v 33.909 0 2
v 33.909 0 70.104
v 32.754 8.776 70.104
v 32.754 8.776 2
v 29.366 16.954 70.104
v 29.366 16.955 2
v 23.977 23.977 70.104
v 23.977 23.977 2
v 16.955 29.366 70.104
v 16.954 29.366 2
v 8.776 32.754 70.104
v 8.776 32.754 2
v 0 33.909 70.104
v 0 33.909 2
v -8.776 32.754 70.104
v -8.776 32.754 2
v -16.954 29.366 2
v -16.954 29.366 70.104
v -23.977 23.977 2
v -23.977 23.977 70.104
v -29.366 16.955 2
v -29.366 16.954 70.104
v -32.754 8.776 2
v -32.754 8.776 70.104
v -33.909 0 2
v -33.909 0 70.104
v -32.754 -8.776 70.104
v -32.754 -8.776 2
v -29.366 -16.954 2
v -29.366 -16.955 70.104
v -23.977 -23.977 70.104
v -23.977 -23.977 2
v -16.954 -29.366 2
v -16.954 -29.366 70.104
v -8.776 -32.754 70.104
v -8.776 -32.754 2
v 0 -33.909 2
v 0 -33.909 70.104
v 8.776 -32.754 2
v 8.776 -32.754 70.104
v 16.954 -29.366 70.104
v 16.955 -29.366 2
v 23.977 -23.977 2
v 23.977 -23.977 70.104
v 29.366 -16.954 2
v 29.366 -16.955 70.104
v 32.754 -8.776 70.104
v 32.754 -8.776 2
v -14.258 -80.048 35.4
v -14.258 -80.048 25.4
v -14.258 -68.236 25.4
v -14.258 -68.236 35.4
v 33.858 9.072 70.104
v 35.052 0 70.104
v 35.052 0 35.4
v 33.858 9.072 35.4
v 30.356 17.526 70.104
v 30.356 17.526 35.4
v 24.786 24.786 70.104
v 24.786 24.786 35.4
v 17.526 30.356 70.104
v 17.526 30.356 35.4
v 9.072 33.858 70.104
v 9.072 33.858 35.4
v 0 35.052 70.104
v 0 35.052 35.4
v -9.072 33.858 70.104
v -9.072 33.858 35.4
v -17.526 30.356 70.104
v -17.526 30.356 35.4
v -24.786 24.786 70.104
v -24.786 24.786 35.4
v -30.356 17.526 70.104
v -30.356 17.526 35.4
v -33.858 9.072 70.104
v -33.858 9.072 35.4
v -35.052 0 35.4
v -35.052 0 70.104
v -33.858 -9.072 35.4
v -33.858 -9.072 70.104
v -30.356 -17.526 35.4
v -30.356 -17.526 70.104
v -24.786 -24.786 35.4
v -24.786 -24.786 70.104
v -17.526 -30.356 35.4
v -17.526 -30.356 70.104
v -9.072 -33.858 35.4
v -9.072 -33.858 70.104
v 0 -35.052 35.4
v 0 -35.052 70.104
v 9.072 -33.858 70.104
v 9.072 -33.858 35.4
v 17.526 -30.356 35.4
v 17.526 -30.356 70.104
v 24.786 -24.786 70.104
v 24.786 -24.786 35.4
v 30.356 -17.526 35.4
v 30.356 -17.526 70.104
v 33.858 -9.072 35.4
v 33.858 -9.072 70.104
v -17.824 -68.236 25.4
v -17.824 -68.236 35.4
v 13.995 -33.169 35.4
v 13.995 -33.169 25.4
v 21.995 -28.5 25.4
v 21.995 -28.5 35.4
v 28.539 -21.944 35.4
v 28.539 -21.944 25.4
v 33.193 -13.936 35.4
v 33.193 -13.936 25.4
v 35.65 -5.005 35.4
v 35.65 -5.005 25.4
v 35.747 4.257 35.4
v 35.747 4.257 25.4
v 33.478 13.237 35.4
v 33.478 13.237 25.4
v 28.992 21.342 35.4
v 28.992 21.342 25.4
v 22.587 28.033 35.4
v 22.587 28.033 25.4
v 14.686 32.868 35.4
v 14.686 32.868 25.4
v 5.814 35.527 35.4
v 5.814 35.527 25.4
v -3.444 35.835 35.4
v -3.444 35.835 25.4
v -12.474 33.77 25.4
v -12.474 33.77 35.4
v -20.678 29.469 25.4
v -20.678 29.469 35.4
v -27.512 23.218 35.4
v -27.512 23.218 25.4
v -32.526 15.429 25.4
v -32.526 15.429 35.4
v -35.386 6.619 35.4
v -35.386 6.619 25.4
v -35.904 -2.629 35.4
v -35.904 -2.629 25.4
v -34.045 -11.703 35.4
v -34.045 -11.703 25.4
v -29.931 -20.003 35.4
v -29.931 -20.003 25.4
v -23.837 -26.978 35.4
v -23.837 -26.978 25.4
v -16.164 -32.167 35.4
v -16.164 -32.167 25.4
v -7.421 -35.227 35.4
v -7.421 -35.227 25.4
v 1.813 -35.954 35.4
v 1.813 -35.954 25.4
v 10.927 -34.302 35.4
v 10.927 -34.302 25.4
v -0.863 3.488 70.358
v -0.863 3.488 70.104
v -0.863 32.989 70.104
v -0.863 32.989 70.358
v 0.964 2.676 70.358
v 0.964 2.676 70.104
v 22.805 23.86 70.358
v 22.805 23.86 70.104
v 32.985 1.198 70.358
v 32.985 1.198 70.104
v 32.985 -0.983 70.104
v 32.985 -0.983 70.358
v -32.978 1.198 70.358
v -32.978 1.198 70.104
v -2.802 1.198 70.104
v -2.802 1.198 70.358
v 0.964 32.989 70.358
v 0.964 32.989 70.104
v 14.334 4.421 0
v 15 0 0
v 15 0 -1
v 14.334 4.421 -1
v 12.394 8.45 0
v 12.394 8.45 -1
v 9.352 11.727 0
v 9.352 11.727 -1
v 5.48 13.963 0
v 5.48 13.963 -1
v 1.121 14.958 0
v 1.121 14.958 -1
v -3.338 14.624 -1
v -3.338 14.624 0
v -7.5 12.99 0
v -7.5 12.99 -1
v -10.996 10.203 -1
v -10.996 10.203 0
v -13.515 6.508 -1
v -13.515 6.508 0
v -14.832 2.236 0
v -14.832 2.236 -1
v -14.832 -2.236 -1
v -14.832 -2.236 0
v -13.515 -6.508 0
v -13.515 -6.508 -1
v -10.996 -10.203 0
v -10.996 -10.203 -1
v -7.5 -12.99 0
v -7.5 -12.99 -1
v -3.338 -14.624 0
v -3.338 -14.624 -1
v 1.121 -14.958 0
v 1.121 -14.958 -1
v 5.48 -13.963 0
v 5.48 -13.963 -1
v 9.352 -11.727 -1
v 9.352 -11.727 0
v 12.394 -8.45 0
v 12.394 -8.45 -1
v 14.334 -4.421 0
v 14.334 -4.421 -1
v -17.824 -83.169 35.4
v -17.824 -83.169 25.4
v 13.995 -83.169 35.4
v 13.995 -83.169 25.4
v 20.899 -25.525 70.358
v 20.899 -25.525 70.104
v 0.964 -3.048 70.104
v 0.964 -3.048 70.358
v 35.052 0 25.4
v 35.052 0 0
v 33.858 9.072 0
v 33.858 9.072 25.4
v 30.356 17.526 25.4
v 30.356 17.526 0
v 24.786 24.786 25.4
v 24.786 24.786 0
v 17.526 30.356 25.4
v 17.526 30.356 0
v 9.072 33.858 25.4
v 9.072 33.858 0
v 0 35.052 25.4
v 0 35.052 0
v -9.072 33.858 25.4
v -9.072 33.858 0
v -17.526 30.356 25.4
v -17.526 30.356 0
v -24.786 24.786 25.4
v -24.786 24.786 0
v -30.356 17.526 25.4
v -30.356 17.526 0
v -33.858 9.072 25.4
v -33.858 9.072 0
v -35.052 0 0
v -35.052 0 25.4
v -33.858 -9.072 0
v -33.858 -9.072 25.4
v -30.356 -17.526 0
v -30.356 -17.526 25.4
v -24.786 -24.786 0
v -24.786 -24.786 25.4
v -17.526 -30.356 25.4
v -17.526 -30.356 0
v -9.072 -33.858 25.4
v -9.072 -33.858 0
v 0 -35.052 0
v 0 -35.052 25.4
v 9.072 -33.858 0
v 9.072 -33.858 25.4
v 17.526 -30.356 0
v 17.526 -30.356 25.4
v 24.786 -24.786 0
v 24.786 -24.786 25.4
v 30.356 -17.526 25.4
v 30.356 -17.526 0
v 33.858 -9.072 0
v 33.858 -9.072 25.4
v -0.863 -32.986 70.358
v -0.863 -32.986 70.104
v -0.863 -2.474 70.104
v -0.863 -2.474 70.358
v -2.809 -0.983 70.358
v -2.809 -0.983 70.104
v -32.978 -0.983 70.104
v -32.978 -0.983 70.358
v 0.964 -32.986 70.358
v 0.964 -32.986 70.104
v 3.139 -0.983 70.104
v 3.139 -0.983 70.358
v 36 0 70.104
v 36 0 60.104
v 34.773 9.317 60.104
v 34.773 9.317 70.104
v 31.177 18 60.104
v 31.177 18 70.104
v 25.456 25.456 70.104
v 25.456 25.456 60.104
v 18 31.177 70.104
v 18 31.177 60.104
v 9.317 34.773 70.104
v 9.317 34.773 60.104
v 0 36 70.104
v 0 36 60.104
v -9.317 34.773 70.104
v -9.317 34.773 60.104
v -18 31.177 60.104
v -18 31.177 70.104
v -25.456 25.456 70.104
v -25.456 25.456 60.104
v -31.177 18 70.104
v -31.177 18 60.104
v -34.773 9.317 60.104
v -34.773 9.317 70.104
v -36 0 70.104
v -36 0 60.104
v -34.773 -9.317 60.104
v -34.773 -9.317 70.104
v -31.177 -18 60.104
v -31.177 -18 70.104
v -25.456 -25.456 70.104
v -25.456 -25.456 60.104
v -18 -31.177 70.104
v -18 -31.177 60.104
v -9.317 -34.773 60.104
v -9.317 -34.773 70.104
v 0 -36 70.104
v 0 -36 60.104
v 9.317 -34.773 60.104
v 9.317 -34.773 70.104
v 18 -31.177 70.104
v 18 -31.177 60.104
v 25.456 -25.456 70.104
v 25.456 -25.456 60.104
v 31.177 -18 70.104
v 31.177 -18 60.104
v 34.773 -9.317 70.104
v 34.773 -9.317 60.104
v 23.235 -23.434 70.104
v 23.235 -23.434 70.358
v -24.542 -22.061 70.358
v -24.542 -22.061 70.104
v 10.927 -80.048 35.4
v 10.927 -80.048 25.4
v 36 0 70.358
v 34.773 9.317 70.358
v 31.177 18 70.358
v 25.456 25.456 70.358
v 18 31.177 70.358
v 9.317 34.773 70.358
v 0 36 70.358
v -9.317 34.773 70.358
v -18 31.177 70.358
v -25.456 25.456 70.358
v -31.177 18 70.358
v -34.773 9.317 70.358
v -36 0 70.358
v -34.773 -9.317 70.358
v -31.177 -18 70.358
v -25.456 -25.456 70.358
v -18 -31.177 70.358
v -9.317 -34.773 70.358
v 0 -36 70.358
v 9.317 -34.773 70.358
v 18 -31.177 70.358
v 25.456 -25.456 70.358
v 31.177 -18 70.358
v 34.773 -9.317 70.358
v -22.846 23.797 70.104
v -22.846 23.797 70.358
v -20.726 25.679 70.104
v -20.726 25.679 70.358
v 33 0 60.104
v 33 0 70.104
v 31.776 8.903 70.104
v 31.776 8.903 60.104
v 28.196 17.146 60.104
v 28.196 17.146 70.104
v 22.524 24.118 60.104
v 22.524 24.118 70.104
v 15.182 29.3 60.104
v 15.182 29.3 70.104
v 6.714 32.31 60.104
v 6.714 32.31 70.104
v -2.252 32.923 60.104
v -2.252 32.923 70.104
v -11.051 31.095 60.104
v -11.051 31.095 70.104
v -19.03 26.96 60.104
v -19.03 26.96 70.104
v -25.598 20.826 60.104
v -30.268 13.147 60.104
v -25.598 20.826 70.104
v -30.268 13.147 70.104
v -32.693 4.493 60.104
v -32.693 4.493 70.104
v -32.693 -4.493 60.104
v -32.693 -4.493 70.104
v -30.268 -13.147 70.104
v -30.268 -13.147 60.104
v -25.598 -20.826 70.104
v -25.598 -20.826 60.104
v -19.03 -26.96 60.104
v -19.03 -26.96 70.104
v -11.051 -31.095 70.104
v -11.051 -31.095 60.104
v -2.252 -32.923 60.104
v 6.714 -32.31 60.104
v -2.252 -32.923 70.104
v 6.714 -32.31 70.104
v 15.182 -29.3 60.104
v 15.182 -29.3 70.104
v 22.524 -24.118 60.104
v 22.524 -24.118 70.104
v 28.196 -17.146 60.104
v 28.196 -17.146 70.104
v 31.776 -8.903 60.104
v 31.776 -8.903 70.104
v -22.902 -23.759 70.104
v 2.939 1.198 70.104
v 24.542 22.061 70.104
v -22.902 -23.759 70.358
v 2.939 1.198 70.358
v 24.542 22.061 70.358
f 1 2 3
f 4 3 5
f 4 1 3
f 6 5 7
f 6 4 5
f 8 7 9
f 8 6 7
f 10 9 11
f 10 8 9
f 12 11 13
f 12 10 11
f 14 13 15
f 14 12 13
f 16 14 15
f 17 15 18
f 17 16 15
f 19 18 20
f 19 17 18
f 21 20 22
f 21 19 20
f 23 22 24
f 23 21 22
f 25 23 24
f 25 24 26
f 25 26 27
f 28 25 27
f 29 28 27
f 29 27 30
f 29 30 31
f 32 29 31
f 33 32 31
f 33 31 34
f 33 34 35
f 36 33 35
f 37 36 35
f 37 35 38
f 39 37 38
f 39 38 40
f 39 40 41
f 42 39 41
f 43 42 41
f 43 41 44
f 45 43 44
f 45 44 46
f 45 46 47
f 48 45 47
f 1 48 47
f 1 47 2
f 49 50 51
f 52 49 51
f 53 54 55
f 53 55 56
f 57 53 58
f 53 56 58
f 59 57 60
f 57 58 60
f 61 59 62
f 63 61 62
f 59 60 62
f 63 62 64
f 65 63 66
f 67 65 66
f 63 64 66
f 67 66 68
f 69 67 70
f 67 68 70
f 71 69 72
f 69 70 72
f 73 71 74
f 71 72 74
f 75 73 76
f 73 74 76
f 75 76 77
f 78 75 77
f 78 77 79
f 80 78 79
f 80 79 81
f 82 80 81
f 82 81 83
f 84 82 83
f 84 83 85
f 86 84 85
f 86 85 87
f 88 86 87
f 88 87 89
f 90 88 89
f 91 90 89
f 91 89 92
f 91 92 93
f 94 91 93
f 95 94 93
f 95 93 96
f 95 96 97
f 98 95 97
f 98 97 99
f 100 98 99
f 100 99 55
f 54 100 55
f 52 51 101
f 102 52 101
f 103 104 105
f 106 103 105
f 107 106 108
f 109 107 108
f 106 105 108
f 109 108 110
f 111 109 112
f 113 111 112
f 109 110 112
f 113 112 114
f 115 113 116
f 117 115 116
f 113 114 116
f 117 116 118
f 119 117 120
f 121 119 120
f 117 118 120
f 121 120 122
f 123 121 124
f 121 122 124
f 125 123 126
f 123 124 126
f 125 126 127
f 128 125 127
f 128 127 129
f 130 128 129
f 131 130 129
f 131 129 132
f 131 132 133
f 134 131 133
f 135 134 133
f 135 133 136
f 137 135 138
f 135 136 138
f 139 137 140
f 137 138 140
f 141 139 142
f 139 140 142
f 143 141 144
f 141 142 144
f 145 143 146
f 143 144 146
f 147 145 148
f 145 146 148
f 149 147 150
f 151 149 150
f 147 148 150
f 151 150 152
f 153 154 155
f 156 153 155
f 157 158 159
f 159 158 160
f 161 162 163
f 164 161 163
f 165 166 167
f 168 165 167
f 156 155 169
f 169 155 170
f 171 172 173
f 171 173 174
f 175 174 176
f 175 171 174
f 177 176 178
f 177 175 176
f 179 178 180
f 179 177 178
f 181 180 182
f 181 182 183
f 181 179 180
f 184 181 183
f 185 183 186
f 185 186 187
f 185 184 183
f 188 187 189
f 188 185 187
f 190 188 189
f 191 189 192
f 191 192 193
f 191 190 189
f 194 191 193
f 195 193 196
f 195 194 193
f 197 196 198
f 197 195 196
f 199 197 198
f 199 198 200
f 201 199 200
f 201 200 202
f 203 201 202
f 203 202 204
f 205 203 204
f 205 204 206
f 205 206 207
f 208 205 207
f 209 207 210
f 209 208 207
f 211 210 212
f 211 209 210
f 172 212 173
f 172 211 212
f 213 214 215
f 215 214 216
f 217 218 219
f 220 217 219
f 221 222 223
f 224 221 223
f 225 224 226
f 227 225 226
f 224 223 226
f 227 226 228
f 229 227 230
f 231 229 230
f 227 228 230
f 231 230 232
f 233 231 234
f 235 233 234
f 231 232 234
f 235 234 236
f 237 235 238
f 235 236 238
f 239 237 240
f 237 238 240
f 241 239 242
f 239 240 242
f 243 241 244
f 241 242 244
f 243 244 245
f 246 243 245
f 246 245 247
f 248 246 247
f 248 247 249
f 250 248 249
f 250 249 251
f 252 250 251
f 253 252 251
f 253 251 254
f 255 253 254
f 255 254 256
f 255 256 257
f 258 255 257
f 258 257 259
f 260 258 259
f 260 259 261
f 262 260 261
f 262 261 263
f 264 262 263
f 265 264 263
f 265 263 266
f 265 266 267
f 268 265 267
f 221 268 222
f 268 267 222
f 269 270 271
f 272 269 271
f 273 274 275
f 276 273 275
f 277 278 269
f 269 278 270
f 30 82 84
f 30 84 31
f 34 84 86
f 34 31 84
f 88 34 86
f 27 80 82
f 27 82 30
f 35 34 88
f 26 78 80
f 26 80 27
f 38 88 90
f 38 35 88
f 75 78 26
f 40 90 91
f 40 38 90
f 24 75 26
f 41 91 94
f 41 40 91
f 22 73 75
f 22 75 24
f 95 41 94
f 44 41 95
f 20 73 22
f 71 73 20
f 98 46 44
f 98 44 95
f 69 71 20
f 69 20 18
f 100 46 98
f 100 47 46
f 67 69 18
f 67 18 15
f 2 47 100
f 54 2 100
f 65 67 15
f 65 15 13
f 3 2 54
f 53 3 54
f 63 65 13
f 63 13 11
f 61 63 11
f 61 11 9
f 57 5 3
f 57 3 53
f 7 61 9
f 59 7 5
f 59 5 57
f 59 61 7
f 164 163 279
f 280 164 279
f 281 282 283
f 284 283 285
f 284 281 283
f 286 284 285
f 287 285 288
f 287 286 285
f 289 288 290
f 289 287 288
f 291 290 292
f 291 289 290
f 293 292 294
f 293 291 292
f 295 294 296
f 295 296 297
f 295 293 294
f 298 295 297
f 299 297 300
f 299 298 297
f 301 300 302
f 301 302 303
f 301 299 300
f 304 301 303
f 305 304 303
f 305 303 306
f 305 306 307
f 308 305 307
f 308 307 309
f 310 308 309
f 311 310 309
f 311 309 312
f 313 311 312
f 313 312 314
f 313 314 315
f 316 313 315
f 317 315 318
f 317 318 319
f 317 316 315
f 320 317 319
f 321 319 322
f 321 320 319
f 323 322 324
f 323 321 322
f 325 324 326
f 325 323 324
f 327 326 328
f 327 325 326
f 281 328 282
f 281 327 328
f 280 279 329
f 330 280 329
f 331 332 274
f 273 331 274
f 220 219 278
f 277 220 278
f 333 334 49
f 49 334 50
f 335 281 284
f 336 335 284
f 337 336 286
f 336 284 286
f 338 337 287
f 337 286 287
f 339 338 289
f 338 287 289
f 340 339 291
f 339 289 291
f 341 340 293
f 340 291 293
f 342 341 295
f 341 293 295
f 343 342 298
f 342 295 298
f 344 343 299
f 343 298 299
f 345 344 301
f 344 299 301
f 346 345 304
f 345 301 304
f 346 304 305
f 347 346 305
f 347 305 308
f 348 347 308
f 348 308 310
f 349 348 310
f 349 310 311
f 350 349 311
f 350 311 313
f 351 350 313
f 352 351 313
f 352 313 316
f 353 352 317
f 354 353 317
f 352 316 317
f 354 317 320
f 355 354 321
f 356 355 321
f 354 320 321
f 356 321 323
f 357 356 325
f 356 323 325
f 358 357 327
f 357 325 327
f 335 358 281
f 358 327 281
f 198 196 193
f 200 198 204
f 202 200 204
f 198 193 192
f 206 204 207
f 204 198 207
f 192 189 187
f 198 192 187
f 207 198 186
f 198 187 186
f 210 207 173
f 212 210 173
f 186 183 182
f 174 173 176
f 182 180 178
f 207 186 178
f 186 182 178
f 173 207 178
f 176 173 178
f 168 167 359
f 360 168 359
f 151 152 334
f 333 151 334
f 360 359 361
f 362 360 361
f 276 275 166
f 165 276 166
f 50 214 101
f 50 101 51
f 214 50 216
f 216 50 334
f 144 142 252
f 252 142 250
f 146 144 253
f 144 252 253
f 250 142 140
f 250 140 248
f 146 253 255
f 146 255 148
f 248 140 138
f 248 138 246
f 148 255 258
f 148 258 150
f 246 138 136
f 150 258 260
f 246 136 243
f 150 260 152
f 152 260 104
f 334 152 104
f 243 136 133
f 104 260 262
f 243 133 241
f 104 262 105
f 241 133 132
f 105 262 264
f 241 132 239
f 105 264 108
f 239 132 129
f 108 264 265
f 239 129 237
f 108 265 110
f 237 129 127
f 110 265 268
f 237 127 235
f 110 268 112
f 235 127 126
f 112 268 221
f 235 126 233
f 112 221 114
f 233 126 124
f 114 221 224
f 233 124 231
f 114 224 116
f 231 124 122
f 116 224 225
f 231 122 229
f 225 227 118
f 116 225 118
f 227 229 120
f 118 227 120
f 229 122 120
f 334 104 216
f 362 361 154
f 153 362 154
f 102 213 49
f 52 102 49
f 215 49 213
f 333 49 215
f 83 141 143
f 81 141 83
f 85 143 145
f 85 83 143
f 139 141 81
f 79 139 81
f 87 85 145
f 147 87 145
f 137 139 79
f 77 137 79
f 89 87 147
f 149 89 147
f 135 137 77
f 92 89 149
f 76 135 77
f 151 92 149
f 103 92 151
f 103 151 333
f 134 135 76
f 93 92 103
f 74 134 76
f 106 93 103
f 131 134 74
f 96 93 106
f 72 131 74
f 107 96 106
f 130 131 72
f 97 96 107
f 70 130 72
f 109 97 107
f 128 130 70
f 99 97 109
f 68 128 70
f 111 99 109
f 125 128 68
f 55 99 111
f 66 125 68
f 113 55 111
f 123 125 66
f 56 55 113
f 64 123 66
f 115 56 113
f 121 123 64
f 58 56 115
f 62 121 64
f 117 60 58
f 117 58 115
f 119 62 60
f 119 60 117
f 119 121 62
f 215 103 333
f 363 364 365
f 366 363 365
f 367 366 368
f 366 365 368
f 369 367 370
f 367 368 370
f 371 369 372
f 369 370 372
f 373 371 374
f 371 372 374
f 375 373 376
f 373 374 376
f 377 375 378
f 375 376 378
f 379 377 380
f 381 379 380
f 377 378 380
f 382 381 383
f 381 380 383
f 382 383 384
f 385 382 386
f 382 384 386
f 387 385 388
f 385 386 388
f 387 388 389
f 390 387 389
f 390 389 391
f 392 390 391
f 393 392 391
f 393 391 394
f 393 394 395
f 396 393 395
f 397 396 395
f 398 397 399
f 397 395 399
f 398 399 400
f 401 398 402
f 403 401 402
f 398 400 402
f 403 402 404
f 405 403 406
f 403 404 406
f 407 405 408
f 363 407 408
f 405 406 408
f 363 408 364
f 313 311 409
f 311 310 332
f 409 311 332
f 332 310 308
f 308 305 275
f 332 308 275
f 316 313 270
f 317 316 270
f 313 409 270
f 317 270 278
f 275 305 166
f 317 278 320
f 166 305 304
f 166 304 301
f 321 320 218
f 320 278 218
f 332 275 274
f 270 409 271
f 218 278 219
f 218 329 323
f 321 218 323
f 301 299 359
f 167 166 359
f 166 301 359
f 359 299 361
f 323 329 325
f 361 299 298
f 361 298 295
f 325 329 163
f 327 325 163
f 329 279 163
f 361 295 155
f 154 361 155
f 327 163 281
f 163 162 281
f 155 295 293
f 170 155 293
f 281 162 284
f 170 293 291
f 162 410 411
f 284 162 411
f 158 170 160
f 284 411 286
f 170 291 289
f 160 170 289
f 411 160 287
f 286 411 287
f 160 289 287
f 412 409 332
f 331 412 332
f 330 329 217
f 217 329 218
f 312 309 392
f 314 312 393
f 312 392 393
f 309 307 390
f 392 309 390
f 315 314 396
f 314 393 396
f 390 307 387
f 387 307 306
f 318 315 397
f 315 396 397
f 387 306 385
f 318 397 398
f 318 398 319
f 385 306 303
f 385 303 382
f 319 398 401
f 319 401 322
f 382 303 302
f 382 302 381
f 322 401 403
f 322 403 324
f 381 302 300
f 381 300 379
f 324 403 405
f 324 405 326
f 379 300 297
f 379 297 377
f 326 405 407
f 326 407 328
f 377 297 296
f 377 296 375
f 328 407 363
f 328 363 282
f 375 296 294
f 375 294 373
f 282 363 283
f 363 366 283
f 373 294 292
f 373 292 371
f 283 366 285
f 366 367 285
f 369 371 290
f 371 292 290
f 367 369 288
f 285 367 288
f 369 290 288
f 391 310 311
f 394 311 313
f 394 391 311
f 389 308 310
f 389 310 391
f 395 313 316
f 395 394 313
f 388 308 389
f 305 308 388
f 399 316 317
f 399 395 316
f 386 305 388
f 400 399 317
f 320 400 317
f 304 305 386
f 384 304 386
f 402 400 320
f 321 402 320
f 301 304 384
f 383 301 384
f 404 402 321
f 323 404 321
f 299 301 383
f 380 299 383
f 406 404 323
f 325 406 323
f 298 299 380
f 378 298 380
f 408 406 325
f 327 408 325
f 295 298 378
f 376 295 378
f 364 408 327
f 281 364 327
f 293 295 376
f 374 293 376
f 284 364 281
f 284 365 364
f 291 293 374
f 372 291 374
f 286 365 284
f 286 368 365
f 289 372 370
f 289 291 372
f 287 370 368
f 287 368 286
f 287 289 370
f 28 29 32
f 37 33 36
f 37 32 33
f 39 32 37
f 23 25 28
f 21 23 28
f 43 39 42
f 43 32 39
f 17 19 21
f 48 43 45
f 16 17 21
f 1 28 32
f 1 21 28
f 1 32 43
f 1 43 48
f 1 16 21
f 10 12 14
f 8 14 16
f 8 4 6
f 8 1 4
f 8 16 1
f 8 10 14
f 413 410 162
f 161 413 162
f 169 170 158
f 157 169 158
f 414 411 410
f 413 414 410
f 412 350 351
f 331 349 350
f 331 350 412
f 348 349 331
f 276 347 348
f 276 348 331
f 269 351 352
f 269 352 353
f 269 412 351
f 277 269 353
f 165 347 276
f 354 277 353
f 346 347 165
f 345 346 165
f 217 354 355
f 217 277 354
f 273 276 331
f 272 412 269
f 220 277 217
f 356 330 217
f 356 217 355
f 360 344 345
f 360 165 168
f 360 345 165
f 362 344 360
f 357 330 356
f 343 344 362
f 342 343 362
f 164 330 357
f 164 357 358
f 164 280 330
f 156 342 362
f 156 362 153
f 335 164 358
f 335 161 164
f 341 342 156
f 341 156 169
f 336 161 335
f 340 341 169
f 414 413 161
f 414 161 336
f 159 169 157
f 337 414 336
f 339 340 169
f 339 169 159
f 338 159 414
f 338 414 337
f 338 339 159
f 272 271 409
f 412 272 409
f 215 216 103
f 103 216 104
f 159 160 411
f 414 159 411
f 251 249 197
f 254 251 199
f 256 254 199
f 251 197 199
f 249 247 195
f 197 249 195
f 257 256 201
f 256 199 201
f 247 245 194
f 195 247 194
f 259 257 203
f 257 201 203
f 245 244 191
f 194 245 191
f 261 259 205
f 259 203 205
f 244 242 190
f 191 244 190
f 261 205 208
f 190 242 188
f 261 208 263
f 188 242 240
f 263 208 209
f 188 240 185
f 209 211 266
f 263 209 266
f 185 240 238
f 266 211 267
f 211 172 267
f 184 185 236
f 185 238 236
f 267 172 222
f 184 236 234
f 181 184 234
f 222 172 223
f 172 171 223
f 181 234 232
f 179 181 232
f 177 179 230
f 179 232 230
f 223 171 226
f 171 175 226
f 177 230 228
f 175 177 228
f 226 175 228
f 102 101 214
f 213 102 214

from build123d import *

# Parameters (mm, degrees)
F0_R      = 35.052
F0_R_2    = 33.909
F1_DEPTH  = 70.104
F2_R      = 35.052
F3_DEPTH  = 1.999996
F4_R      = 14.99997
F5_DEPTH  = 0.999998
F6_R      = 36.0000042
F6_R_2    = 32.9999975
F7_DEPTH  = 9.99998
F8_R      = 36.0000042
F9_DEPTH  = 0.9398
F11_R     = 35.052
F12_DEPTH = 10.0000054
F13_DEPTH = 10.0000054
F14_DEPTH = 0.254


with BuildPart() as f1:
    # F0 (on Top) → F1 (new body)
    with BuildSketch(Plane.XY):
        Circle(F0_R)
        Circle(F0_R_2, mode=Mode.SUBTRACT)
    extrude(amount=F1_DEPTH)

    # F2 (on Top) → F3 (join)
    with BuildSketch(Plane.XY):
        Circle(F2_R)
    extrude(amount=F3_DEPTH)

    # F4 (on face) → F5 (join)
    with BuildSketch(Plane.XY):
        Circle(F4_R)
    extrude(amount=-F5_DEPTH)

    # F8 (on face) → F9 (cut)
    with BuildSketch(Plane.XY.offset(70.104)):
        Circle(F8_R)
        Polygon((-0.8631545961, 3.4883117496), (-0.8631545961, 32.9887071457), (0.9636605694, 32.9887071457), (0.9636605694, 2.6763906699), (22.80452686, 23.8601211458), (24.5416078782, 22.0614894727), (2.938679691, 1.1978312537), (32.9853559722, 1.1978312537), (32.9853559722, -0.9829172856), (3.1389852868, -0.9829172856), (23.2346414068, -23.4339769074), (20.899284631, -25.5249813199), (0.9636605694, -3.0481130643), (0.9636605694, -32.9859241694), (-0.8631545961, -32.9859241694), (-0.8631545961, -2.4739011377), (-22.9023173451, -23.7588656131), (-24.5416078782, -22.0614894727), (-2.8091619684, -0.9829172856), (-32.9782509434, -0.9829172856), (-32.9782509434, 1.1978312537), (-2.8022354953, 1.1978312537), (-22.8459511004, 23.796569754), (-20.7260778787, 25.6793600147), align=None, mode=Mode.SUBTRACT)
    extrude(amount=F9_DEPTH, mode=Mode.SUBTRACT)

    # F11 (on offset) → F12 (join)
    with BuildSketch(Plane.XY.offset(25.4)):
        with BuildLine():
            ThreePointArc((13.9945056409, -33.1685711822), (29.998354657, -19.9022365646), (36.0000042, 0))
            ThreePointArc((36.0000042, 0), (-29.0635094887, 21.2441219776), (10.9270783141, -34.3015927023))
            Line((10.9270783141, -34.3015927023), (13.9945056409, -33.1685711822))
        make_face()
        Circle(F11_R, mode=Mode.SUBTRACT)
        with BuildLine():
            Line((13.9945056409, -33.1685711822), (10.9270783141, -34.3015927023))
            ThreePointArc((10.9270783141, -34.3015927023), (12.4736631007, -33.769927913), (13.9945056409, -33.1685711822))
        make_face()
        with BuildLine():
            ThreePointArc((13.9945056409, -33.1685711822), (12.4736631007, -33.769927913), (10.9270783141, -34.3015927023))
            Line((10.9270783141, -34.3015927023), (10.9270783141, -80.0483375344))
            Line((10.9270783141, -80.0483375344), (-14.2576834187, -80.0483375344))
            Line((-14.2576834187, -80.0483375344), (-14.2576834187, -68.2360119674))
            Line((-14.2576834187, -68.2360119674), (-17.8236663342, -68.2360119674))
            Line((-17.8236663342, -68.2360119674), (-17.8236663342, -83.1685727822))
            Line((-17.8236663342, -83.1685727822), (13.9945056409, -83.1685727822))
            Line((13.9945056409, -83.1685727822), (13.9945056409, -33.1685711822))
        make_face()
    extrude(amount=F12_DEPTH)

    # F11 (on offset) → F13 (join)
    with BuildSketch(Plane.XY.offset(25.4)):
        with BuildLine():
            ThreePointArc((13.9945056409, -33.1685711822), (29.998354657, -19.9022365646), (36.0000042, 0))
            ThreePointArc((36.0000042, 0), (-29.0635094887, 21.2441219776), (10.9270783141, -34.3015927023))
            Line((10.9270783141, -34.3015927023), (13.9945056409, -33.1685711822))
        make_face()
        Circle(F11_R, mode=Mode.SUBTRACT)
        with BuildLine():
            Line((13.9945056409, -33.1685711822), (10.9270783141, -34.3015927023))
            ThreePointArc((10.9270783141, -34.3015927023), (12.4736631007, -33.769927913), (13.9945056409, -33.1685711822))
        make_face()
        with BuildLine():
            ThreePointArc((13.9945056409, -33.1685711822), (12.4736631007, -33.769927913), (10.9270783141, -34.3015927023))
            Line((10.9270783141, -34.3015927023), (10.9270783141, -80.0483375344))
            Line((10.9270783141, -80.0483375344), (-14.2576834187, -80.0483375344))
            Line((-14.2576834187, -80.0483375344), (-14.2576834187, -68.2360119674))
            Line((-14.2576834187, -68.2360119674), (-17.8236663342, -68.2360119674))
            Line((-17.8236663342, -68.2360119674), (-17.8236663342, -83.1685727822))
            Line((-17.8236663342, -83.1685727822), (13.9945056409, -83.1685727822))
            Line((13.9945056409, -83.1685727822), (13.9945056409, -33.1685711822))
        make_face()
    extrude(amount=F13_DEPTH)


with BuildPart() as f7:
    # F6 (on face) → F7 (new body)
    with BuildSketch(Plane.XY.offset(70.104)):
        Circle(F6_R)
        Circle(F6_R_2, mode=Mode.SUBTRACT)
    extrude(amount=-F7_DEPTH)


with BuildPart() as f14:
    # F8 (on face) → F14 (new body)
    with BuildSketch(Plane.XY.offset(70.104)):
        Circle(F8_R)
        Polygon((-0.8631545961, 3.4883117496), (-0.8631545961, 32.9887071457), (0.9636605694, 32.9887071457), (0.9636605694, 2.6763906699), (22.80452686, 23.8601211458), (24.5416078782, 22.0614894727), (2.938679691, 1.1978312537), (32.9853559722, 1.1978312537), (32.9853559722, -0.9829172856), (3.1389852868, -0.9829172856), (23.2346414068, -23.4339769074), (20.899284631, -25.5249813199), (0.9636605694, -3.0481130643), (0.9636605694, -32.9859241694), (-0.8631545961, -32.9859241694), (-0.8631545961, -2.4739011377), (-22.9023173451, -23.7588656131), (-24.5416078782, -22.0614894727), (-2.8091619684, -0.9829172856), (-32.9782509434, -0.9829172856), (-32.9782509434, 1.1978312537), (-2.8022354953, 1.1978312537), (-22.8459511004, 23.796569754), (-20.7260778787, 25.6793600147), align=None, mode=Mode.SUBTRACT)
    extrude(amount=F14_DEPTH)


solid = Compound([f1.part, f7.part, f14.part])
